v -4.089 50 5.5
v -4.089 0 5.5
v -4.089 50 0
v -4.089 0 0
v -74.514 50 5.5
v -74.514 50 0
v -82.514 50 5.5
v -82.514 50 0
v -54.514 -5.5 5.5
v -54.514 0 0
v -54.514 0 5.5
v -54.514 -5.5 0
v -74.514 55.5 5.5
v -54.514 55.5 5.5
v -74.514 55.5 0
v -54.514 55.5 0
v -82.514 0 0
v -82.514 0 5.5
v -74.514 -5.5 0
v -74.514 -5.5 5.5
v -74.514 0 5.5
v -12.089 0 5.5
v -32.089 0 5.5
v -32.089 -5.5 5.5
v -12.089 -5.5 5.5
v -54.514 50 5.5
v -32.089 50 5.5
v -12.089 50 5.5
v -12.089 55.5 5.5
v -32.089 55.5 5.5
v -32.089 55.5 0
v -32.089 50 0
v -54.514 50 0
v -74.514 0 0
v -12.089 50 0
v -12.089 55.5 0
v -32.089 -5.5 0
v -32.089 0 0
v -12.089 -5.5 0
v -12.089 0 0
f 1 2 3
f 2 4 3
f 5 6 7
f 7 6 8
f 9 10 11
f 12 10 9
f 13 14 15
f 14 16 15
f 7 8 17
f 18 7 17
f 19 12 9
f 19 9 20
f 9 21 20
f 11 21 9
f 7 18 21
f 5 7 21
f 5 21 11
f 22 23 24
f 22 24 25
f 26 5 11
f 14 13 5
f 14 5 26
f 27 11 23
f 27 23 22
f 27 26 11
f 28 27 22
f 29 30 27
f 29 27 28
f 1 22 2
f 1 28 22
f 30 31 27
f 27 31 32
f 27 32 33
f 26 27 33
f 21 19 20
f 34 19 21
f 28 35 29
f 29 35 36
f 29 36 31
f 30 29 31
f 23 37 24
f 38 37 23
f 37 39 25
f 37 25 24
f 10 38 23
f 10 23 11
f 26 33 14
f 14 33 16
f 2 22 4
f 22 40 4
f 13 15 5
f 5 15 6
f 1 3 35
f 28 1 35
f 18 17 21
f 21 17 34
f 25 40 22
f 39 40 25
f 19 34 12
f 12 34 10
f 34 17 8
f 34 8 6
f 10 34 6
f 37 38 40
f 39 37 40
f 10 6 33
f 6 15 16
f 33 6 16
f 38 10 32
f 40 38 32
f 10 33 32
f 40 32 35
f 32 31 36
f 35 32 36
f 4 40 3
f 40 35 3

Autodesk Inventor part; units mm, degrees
ref_plane "YZ Plane" through (0, 0, 0) normal (1, 0, 0) x (0, 1, 0)
ref_plane "XZ Plane" through (0, 0, 0) normal (0, 1, 0) x (-1, 0, 0)
ref_plane "XY Plane" through (0, 0, 0) normal (0, 0, 1) x (1, 0, 0)
sketch "Sketch1" plane through (0, 0, 0) normal (0, 0, 1) x (1, 0, 0)
  line L0 (-12.089, 0) -> (-12.089, -5.5)
  line L1 (-12.089, -5.5) -> (-32.089, -5.5)
  line L2 (-32.089, -5.5) -> (-32.089, 0)
  line L3 (-54.514, 0) -> (-54.514, -5.5)
  line L4 (-54.514, -5.5) -> (-74.514, -5.5)
  line L5 (-74.514, -5.5) -> (-74.514, 0)
  line L6 (-32.089, 0) -> (-54.514, 0)
  line L7 (-12.089, 50) -> (-12.089, 55.5)
  line L8 (-12.089, 55.5) -> (-32.089, 55.5)
  line L9 (-32.089, 55.5) -> (-32.089, 50)
  line L10 (-54.514, 50) -> (-54.514, 55.5)
  line L11 (-54.514, 55.5) -> (-74.514, 55.5)
  line L12 (-74.514, 55.5) -> (-74.514, 50)
  line L13 (-32.089, 50) -> (-54.514, 50)
  line L14 (-12.089, 0) -> (-4.089, 0)
  line L15 (-4.089, 0) -> (-4.089, 50)
  line L16 (-4.089, 50) -> (-12.089, 50)
  line L17 (-74.514, 50) -> (-82.514, 50)
  line L18 (-82.514, 50) -> (-82.514, 0)
  line L19 (-82.514, 0) -> (-74.514, 0)
  dimension "d2" = 5.5
  dimension "d3" = 20
  dimension "d4" = 5.5
  dimension "d5" = 20
  dimension "d6" = 90
  dimension "d18" = 8
  dimension "d20" = 8
extrude "Extrusion1" add sketch "Sketch1" along normal blind 5.5
properties part number "lado"
